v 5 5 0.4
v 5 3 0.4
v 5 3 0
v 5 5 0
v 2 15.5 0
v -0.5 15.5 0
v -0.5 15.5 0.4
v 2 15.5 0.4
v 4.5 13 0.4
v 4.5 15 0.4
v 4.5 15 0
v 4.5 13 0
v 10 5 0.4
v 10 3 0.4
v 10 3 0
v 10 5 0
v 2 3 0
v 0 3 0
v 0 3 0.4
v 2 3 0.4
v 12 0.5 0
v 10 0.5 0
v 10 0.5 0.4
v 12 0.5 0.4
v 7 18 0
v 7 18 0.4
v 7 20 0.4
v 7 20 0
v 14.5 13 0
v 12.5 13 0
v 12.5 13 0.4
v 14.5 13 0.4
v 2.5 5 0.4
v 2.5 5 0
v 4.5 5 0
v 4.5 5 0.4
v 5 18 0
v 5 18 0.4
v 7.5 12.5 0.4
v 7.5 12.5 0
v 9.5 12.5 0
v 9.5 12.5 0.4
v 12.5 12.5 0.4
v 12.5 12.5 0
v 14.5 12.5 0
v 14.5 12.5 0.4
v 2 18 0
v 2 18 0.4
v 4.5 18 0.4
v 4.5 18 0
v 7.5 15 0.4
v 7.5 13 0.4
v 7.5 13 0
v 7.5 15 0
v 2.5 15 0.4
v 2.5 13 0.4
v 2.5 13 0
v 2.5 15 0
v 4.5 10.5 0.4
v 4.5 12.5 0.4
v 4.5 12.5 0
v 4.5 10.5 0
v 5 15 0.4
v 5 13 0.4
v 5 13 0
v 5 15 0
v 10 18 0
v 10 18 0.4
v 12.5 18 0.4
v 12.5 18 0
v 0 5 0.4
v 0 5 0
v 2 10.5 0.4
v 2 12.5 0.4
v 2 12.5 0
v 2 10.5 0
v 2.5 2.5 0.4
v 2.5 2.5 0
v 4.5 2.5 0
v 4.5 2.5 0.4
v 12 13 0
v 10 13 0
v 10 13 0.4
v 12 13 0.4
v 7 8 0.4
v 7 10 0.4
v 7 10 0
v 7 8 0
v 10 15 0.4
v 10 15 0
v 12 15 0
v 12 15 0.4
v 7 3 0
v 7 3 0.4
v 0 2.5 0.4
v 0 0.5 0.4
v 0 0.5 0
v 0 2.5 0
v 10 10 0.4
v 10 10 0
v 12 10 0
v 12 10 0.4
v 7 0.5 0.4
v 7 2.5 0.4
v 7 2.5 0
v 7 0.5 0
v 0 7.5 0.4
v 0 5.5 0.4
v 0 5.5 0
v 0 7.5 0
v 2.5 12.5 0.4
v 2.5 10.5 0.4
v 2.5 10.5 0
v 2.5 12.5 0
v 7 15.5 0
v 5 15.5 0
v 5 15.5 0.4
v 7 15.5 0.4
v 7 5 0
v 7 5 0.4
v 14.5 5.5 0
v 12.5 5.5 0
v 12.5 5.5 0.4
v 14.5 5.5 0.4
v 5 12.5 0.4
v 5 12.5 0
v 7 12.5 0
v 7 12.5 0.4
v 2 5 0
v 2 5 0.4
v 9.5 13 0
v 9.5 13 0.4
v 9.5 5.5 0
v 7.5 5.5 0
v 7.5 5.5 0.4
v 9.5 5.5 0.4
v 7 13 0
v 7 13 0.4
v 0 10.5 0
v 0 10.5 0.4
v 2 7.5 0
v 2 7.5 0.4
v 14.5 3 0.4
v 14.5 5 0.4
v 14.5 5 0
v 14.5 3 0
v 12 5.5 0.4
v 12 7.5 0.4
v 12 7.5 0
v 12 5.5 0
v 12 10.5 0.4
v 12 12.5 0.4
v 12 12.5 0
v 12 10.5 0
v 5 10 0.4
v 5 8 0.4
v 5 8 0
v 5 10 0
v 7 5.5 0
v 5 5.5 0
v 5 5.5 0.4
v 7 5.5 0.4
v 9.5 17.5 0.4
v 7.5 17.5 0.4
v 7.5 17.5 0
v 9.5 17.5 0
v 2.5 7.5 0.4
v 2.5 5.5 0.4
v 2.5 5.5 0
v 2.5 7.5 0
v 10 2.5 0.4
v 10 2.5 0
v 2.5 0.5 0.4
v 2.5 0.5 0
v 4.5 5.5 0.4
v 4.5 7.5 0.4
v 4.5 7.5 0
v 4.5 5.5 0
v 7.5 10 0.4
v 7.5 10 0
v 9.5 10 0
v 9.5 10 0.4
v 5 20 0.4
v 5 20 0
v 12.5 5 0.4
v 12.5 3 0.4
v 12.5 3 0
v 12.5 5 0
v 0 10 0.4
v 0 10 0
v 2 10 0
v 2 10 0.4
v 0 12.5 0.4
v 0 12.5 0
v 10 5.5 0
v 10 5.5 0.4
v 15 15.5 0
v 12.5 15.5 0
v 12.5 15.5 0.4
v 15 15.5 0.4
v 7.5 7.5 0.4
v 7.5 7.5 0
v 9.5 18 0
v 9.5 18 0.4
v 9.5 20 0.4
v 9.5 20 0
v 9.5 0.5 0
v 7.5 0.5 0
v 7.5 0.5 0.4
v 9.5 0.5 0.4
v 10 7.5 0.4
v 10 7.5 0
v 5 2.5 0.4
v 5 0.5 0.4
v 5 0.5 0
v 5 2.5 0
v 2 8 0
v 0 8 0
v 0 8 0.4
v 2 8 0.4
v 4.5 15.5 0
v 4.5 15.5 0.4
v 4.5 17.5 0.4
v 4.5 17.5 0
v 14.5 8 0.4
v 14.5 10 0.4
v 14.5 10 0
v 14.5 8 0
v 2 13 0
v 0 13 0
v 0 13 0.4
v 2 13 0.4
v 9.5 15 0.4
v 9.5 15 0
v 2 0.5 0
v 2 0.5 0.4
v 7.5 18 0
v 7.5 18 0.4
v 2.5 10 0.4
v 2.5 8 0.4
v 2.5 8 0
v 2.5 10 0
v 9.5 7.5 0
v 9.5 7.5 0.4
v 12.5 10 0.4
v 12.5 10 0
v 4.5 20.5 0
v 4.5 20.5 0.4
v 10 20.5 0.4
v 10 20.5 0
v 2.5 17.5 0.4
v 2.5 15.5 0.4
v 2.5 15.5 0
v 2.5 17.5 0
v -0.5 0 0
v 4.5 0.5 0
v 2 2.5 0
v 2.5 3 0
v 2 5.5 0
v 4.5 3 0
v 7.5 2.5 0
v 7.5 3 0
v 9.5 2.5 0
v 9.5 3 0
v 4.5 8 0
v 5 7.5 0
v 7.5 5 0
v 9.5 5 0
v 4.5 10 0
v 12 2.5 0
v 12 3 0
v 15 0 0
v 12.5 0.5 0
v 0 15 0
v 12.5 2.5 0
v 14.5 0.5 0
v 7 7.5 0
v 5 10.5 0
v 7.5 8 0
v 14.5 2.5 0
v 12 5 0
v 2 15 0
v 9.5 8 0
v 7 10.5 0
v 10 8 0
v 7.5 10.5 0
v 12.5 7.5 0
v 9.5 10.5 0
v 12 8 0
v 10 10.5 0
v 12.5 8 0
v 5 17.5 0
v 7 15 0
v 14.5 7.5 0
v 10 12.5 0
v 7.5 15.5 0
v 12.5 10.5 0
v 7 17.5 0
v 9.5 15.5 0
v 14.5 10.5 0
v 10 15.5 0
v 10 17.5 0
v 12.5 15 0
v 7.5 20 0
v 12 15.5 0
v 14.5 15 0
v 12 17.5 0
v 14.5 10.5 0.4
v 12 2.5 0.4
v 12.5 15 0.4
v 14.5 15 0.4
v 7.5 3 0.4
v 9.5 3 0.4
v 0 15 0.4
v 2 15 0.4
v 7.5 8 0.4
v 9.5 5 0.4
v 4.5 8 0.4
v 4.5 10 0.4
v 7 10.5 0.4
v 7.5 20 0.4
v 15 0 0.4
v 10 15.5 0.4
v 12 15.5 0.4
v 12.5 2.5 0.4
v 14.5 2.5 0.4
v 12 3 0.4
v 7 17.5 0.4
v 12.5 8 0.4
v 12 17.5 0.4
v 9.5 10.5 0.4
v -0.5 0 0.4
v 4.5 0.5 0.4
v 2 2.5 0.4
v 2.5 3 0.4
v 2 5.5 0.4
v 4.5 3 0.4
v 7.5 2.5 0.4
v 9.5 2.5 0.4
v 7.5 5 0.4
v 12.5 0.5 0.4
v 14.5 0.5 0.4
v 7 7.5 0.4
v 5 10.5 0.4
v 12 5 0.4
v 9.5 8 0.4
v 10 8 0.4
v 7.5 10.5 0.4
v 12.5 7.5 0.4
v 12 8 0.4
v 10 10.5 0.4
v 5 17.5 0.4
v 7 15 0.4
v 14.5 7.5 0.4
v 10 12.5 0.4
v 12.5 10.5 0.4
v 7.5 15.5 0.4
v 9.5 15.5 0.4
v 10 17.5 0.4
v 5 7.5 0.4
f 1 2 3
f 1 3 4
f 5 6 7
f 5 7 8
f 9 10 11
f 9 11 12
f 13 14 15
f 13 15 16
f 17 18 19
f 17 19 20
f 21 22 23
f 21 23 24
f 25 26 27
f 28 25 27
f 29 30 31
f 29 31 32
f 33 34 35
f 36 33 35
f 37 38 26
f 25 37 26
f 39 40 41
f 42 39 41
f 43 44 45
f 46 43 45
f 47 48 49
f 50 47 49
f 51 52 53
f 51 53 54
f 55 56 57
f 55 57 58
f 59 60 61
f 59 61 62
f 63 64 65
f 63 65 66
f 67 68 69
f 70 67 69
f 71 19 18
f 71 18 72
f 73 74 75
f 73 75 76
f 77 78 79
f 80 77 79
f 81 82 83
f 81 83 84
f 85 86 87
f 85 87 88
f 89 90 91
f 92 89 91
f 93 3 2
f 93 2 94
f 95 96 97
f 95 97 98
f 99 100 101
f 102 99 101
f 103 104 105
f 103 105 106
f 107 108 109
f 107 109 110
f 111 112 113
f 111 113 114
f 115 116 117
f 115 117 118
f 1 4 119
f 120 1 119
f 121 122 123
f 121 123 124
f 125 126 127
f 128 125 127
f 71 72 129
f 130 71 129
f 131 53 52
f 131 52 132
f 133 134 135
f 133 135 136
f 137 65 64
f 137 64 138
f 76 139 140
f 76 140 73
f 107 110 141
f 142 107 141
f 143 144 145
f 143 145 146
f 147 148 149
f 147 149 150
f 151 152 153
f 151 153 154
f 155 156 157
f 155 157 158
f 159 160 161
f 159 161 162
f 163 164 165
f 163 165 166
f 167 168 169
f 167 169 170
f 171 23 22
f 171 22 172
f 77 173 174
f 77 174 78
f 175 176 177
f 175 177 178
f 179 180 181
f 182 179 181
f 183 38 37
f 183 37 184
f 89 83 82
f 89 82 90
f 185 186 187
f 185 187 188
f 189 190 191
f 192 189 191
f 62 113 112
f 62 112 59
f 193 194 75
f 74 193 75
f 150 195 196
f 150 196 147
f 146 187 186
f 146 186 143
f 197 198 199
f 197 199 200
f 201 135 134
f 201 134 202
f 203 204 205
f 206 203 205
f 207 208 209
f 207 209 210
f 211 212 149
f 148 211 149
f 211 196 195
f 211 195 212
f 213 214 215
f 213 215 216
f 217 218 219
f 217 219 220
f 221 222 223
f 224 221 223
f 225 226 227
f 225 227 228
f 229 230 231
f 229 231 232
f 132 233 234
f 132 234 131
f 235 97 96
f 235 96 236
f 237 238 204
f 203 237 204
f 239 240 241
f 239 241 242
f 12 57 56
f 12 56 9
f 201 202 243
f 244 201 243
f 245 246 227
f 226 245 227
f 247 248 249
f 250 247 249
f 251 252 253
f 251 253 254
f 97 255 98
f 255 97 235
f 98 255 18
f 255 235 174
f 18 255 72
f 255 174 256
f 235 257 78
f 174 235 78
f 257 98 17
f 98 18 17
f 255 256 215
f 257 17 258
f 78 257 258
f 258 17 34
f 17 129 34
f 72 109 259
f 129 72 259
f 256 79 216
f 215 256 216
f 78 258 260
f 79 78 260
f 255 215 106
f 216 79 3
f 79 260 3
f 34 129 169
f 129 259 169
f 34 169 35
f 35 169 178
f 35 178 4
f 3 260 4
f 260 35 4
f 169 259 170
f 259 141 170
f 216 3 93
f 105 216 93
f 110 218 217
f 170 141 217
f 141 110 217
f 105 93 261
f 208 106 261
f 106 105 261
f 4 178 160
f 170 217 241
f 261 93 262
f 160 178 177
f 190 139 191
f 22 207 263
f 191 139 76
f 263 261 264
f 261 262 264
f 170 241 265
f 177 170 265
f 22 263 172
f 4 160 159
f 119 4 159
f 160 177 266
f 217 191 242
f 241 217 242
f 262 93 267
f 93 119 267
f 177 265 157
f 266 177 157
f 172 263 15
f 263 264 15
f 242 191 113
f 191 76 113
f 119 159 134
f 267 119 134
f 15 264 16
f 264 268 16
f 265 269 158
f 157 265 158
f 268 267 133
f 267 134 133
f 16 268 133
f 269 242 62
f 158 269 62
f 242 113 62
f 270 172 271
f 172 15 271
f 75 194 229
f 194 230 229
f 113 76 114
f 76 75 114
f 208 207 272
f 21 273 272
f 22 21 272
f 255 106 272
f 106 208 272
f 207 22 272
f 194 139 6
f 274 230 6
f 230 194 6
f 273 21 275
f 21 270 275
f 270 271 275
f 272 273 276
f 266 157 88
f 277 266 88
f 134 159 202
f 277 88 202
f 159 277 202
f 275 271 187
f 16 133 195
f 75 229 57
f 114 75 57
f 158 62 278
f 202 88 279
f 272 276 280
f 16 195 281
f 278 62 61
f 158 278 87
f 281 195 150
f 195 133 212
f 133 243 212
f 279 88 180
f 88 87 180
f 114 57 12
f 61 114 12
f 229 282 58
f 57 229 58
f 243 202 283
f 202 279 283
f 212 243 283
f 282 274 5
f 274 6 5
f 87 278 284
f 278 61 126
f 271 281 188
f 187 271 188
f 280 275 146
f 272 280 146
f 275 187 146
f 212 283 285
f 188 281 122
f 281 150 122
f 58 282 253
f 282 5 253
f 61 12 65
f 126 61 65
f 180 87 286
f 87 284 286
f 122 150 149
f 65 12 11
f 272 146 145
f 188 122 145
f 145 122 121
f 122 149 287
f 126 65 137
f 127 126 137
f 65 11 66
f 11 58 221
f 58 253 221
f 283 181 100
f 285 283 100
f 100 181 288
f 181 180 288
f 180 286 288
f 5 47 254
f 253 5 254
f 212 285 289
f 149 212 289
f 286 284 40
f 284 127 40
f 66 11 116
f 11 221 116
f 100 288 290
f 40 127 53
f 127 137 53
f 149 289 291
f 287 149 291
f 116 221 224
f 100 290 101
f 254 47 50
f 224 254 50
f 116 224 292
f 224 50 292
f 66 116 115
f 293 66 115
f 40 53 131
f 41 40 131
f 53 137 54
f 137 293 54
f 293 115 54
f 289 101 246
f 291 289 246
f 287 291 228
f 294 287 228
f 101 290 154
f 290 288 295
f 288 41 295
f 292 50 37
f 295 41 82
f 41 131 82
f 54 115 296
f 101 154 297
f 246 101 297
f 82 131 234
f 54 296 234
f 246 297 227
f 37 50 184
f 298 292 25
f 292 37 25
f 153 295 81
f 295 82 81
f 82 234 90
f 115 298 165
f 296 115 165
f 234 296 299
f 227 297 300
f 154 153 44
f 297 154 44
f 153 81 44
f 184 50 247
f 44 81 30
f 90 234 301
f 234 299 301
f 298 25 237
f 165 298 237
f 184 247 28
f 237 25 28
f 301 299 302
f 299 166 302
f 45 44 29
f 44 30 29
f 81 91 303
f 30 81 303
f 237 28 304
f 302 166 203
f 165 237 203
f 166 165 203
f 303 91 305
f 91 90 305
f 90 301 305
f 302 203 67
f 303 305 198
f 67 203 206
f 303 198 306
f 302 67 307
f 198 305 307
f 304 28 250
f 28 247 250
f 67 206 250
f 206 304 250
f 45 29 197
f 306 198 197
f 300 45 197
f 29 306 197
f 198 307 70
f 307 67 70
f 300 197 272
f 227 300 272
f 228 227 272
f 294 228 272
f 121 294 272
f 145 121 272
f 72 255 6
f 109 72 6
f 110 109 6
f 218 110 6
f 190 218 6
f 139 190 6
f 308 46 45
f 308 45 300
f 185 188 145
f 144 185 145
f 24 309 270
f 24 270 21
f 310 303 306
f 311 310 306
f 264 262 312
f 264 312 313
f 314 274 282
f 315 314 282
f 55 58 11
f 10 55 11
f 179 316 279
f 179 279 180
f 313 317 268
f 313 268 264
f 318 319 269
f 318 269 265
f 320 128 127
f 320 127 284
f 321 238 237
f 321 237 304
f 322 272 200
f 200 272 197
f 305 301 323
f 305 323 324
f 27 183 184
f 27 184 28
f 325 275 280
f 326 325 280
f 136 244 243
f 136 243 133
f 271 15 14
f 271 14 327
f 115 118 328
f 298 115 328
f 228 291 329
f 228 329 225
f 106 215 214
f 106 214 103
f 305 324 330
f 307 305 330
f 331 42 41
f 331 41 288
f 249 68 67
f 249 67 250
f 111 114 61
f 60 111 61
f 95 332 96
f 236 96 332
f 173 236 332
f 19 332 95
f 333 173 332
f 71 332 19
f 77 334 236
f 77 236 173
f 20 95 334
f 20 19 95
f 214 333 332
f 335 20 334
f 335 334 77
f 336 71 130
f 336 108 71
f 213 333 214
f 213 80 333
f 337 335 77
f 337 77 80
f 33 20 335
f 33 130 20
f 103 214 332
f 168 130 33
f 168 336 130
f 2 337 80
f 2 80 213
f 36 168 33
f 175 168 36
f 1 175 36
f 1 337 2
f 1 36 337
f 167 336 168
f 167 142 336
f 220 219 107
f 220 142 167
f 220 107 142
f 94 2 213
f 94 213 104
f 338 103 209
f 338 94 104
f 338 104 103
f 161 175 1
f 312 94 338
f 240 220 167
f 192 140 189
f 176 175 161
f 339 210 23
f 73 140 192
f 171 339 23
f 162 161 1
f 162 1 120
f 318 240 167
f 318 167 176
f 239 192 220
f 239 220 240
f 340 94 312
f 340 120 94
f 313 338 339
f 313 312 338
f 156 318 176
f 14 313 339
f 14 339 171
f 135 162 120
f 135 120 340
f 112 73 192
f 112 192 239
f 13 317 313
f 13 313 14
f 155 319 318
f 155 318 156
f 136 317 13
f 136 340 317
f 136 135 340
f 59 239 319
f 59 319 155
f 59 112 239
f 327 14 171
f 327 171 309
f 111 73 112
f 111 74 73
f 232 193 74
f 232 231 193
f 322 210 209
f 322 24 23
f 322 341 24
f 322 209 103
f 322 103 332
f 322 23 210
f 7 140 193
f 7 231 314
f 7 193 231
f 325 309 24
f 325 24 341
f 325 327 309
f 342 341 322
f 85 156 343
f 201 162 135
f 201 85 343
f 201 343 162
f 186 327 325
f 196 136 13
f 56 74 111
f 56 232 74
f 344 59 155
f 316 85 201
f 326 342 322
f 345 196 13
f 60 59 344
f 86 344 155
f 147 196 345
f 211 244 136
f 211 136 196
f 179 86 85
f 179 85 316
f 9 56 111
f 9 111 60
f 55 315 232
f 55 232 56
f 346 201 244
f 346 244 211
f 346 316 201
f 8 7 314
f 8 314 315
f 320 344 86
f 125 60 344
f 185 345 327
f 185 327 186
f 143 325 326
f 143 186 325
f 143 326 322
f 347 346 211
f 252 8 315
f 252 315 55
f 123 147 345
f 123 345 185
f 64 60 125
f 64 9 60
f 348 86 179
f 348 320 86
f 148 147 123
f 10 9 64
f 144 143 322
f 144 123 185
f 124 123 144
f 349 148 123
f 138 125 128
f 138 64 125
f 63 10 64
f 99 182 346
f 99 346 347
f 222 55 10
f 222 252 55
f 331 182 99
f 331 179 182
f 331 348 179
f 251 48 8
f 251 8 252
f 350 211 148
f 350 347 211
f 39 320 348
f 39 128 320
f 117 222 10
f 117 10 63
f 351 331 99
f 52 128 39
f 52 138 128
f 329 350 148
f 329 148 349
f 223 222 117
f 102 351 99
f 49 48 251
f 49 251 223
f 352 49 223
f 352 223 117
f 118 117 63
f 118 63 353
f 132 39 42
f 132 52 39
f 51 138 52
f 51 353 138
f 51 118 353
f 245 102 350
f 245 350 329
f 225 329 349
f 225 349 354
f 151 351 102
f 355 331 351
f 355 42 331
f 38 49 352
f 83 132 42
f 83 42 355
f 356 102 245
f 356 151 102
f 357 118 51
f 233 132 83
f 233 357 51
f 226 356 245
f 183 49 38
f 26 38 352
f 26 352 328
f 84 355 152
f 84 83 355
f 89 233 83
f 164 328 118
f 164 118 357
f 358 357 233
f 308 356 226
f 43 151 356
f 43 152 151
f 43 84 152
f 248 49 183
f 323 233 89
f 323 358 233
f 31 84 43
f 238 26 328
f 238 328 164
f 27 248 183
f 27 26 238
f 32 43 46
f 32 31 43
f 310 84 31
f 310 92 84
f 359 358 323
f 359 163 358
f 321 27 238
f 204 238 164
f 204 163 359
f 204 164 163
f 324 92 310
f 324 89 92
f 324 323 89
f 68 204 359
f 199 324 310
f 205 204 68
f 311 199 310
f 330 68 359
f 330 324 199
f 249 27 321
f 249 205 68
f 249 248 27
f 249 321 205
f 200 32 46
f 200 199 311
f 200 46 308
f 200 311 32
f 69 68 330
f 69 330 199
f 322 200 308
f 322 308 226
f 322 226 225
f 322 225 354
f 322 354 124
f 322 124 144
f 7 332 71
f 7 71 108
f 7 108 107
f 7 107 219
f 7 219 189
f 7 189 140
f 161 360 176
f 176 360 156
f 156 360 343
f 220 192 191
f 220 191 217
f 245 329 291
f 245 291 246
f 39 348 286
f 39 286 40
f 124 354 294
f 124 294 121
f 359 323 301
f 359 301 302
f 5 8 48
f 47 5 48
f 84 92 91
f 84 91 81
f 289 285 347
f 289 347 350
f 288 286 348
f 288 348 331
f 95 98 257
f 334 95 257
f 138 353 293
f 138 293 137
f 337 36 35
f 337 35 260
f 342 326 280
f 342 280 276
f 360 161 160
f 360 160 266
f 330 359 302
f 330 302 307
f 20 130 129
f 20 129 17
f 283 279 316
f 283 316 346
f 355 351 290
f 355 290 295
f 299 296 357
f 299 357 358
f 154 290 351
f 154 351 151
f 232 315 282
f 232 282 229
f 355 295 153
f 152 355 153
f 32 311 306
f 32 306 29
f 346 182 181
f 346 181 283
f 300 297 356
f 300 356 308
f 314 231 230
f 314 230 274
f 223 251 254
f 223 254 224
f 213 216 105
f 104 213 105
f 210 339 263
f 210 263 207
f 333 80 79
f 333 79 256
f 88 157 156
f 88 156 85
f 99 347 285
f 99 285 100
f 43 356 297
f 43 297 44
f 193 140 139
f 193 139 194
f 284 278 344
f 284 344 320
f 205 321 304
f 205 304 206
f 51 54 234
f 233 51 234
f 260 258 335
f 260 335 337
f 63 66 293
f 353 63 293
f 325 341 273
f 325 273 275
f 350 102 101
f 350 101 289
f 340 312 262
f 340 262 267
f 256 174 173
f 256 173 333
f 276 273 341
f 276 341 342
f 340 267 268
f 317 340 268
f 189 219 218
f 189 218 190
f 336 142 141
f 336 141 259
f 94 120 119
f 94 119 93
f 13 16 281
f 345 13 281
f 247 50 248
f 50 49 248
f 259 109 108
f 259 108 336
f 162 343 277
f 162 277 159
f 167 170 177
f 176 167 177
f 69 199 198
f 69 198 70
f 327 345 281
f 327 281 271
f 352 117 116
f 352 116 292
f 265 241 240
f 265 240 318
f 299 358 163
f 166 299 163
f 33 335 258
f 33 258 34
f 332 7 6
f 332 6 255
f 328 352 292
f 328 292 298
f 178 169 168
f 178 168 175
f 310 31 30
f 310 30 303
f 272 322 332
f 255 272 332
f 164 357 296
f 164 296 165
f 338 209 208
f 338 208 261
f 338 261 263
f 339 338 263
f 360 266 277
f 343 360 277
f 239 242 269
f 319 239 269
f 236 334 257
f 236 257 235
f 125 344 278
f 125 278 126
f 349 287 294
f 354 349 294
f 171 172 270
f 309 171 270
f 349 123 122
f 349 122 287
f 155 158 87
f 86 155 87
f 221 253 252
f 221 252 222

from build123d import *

# Parameters (mm, degrees)
SKETCH_1_W             = 15
SKETCH_1_H             = 0.5
EXTRUDE_1_DEPTH        = 0.4
PATTERN_LINEAR_1_COUNT = 7
PATTERN_LINEAR_1_PITCH = 2.5
EXTRUDE_3_DEPTH        = 0.4
PATTERN_LINEAR_2_COUNT = 7
PATTERN_LINEAR_2_PITCH = 2.5
SKETCH_4_W             = 0.5
SKETCH_4_H             = 2.5
EXTRUDE_4_DEPTH        = 0.4
SKETCH_6_W             = 0.5
SKETCH_6_H             = 2.5
EXTRUDE_6_DEPTH        = 0.4
SKETCH_7_W             = 10.5
SKETCH_7_H             = 0.5
SKETCH_7_W_2           = 5.5
EXTRUDE_7_DEPTH        = 0.4


with BuildPart() as part:
    # Sketch 1 → Extrude 1 (new body)
    with BuildSketch(Plane.XY):
        with Locations((7.5, 0.25)):
            Rectangle(SKETCH_1_W, SKETCH_1_H)
    extrude(amount=EXTRUDE_1_DEPTH)


with BuildPart() as pattern_linear_1_1:
    # Pattern Linear 1: pattern copy
    add(part.part.moved(Location(Vector(0, 1, 0) * (1 * PATTERN_LINEAR_1_PITCH))))


with BuildPart() as pattern_linear_1_2:
    # Pattern Linear 1: pattern copy
    add(part.part.moved(Location(Vector(0, 1, 0) * (2 * PATTERN_LINEAR_1_PITCH))))


with BuildPart() as pattern_linear_1_3:
    # Pattern Linear 1: pattern copy
    add(part.part.moved(Location(Vector(0, 1, 0) * (3 * PATTERN_LINEAR_1_PITCH))))


with BuildPart() as pattern_linear_1_4:
    # Pattern Linear 1: pattern copy
    add(part.part.moved(Location(Vector(0, 1, 0) * (4 * PATTERN_LINEAR_1_PITCH))))


with BuildPart() as pattern_linear_1_5:
    # Pattern Linear 1: pattern copy
    add(part.part.moved(Location(Vector(0, 1, 0) * (5 * PATTERN_LINEAR_1_PITCH))))


with BuildPart() as pattern_linear_1_6:
    # Pattern Linear 1: pattern copy
    add(part.part.moved(Location(Vector(0, 1, 0) * (6 * PATTERN_LINEAR_1_PITCH))))


with BuildPart() as part_1:
    add(part.part)

    add(pattern_linear_1_1.part)  # Extrude 3 merges Pattern Linear 1_1

    add(pattern_linear_1_2.part)  # Extrude 3 merges Pattern Linear 1_2

    add(pattern_linear_1_3.part)  # Extrude 3 merges Pattern Linear 1_3
    # Sketch 3 → Extrude 3 (add)
    with BuildSketch(Plane.XY.offset(0.4)):
        Polygon((0, 15.5), (0, 8), (0, 0), (-0.5, 0), (-0.5, 10.98507125), (-0.5, 15.5), align=None)
    extrude_3 = extrude(amount=-EXTRUDE_3_DEPTH)

    # Pattern Linear 2: Extrude 3 ×7
    with Locations(*[(i * PATTERN_LINEAR_2_PITCH, 0, 0) for i in range(1, PATTERN_LINEAR_2_COUNT)]):
        add(extrude_3)

    add(pattern_linear_1_6.part)  # Extrude 4 merges Pattern Linear 1_6
    # Sketch 4 → Extrude 4 (add)
    with BuildSketch(Plane.XY.offset(0.4)):
        with Locations((4.75, 16.75)):
            Rectangle(SKETCH_4_W, SKETCH_4_H)
        with Locations((2.25, 16.75)):
            Rectangle(SKETCH_4_W, SKETCH_4_H)
        with Locations((7.25, 16.75)):
            Rectangle(SKETCH_4_W, SKETCH_4_H)
        with Locations((9.75, 16.75)):
            Rectangle(SKETCH_4_W, SKETCH_4_H)
        with Locations((12.25, 16.75)):
            Rectangle(SKETCH_4_W, SKETCH_4_H)
    extrude(amount=-EXTRUDE_4_DEPTH)

    # Sketch 6 → Extrude 6 (add)
    with BuildSketch(Plane.XY.offset(0.4)):
        with Locations((4.75, 19.25)):
            Rectangle(SKETCH_6_W, SKETCH_6_H)
        with Locations((9.75, 19.25)):
            Rectangle(SKETCH_6_W, SKETCH_6_H)
        with Locations((7.25, 19.25)):
            Rectangle(SKETCH_6_W, SKETCH_6_H)
    extrude(amount=-EXTRUDE_6_DEPTH)

    # Sketch 7 → Extrude 7 (add)
    with BuildSketch(Plane.XY.offset(0.4)):
        with Locations((7.25, 17.75)):
            Rectangle(SKETCH_7_W, SKETCH_7_H)
        with Locations((7.25, 20.25)):
            Rectangle(SKETCH_7_W_2, SKETCH_7_H)
    extrude(amount=-EXTRUDE_7_DEPTH)

    # Combine 1: union Pattern Linear 1_5, Pattern Linear 1_4
    add(pattern_linear_1_5.part)
    add(pattern_linear_1_4.part)


solid = part_1.part
